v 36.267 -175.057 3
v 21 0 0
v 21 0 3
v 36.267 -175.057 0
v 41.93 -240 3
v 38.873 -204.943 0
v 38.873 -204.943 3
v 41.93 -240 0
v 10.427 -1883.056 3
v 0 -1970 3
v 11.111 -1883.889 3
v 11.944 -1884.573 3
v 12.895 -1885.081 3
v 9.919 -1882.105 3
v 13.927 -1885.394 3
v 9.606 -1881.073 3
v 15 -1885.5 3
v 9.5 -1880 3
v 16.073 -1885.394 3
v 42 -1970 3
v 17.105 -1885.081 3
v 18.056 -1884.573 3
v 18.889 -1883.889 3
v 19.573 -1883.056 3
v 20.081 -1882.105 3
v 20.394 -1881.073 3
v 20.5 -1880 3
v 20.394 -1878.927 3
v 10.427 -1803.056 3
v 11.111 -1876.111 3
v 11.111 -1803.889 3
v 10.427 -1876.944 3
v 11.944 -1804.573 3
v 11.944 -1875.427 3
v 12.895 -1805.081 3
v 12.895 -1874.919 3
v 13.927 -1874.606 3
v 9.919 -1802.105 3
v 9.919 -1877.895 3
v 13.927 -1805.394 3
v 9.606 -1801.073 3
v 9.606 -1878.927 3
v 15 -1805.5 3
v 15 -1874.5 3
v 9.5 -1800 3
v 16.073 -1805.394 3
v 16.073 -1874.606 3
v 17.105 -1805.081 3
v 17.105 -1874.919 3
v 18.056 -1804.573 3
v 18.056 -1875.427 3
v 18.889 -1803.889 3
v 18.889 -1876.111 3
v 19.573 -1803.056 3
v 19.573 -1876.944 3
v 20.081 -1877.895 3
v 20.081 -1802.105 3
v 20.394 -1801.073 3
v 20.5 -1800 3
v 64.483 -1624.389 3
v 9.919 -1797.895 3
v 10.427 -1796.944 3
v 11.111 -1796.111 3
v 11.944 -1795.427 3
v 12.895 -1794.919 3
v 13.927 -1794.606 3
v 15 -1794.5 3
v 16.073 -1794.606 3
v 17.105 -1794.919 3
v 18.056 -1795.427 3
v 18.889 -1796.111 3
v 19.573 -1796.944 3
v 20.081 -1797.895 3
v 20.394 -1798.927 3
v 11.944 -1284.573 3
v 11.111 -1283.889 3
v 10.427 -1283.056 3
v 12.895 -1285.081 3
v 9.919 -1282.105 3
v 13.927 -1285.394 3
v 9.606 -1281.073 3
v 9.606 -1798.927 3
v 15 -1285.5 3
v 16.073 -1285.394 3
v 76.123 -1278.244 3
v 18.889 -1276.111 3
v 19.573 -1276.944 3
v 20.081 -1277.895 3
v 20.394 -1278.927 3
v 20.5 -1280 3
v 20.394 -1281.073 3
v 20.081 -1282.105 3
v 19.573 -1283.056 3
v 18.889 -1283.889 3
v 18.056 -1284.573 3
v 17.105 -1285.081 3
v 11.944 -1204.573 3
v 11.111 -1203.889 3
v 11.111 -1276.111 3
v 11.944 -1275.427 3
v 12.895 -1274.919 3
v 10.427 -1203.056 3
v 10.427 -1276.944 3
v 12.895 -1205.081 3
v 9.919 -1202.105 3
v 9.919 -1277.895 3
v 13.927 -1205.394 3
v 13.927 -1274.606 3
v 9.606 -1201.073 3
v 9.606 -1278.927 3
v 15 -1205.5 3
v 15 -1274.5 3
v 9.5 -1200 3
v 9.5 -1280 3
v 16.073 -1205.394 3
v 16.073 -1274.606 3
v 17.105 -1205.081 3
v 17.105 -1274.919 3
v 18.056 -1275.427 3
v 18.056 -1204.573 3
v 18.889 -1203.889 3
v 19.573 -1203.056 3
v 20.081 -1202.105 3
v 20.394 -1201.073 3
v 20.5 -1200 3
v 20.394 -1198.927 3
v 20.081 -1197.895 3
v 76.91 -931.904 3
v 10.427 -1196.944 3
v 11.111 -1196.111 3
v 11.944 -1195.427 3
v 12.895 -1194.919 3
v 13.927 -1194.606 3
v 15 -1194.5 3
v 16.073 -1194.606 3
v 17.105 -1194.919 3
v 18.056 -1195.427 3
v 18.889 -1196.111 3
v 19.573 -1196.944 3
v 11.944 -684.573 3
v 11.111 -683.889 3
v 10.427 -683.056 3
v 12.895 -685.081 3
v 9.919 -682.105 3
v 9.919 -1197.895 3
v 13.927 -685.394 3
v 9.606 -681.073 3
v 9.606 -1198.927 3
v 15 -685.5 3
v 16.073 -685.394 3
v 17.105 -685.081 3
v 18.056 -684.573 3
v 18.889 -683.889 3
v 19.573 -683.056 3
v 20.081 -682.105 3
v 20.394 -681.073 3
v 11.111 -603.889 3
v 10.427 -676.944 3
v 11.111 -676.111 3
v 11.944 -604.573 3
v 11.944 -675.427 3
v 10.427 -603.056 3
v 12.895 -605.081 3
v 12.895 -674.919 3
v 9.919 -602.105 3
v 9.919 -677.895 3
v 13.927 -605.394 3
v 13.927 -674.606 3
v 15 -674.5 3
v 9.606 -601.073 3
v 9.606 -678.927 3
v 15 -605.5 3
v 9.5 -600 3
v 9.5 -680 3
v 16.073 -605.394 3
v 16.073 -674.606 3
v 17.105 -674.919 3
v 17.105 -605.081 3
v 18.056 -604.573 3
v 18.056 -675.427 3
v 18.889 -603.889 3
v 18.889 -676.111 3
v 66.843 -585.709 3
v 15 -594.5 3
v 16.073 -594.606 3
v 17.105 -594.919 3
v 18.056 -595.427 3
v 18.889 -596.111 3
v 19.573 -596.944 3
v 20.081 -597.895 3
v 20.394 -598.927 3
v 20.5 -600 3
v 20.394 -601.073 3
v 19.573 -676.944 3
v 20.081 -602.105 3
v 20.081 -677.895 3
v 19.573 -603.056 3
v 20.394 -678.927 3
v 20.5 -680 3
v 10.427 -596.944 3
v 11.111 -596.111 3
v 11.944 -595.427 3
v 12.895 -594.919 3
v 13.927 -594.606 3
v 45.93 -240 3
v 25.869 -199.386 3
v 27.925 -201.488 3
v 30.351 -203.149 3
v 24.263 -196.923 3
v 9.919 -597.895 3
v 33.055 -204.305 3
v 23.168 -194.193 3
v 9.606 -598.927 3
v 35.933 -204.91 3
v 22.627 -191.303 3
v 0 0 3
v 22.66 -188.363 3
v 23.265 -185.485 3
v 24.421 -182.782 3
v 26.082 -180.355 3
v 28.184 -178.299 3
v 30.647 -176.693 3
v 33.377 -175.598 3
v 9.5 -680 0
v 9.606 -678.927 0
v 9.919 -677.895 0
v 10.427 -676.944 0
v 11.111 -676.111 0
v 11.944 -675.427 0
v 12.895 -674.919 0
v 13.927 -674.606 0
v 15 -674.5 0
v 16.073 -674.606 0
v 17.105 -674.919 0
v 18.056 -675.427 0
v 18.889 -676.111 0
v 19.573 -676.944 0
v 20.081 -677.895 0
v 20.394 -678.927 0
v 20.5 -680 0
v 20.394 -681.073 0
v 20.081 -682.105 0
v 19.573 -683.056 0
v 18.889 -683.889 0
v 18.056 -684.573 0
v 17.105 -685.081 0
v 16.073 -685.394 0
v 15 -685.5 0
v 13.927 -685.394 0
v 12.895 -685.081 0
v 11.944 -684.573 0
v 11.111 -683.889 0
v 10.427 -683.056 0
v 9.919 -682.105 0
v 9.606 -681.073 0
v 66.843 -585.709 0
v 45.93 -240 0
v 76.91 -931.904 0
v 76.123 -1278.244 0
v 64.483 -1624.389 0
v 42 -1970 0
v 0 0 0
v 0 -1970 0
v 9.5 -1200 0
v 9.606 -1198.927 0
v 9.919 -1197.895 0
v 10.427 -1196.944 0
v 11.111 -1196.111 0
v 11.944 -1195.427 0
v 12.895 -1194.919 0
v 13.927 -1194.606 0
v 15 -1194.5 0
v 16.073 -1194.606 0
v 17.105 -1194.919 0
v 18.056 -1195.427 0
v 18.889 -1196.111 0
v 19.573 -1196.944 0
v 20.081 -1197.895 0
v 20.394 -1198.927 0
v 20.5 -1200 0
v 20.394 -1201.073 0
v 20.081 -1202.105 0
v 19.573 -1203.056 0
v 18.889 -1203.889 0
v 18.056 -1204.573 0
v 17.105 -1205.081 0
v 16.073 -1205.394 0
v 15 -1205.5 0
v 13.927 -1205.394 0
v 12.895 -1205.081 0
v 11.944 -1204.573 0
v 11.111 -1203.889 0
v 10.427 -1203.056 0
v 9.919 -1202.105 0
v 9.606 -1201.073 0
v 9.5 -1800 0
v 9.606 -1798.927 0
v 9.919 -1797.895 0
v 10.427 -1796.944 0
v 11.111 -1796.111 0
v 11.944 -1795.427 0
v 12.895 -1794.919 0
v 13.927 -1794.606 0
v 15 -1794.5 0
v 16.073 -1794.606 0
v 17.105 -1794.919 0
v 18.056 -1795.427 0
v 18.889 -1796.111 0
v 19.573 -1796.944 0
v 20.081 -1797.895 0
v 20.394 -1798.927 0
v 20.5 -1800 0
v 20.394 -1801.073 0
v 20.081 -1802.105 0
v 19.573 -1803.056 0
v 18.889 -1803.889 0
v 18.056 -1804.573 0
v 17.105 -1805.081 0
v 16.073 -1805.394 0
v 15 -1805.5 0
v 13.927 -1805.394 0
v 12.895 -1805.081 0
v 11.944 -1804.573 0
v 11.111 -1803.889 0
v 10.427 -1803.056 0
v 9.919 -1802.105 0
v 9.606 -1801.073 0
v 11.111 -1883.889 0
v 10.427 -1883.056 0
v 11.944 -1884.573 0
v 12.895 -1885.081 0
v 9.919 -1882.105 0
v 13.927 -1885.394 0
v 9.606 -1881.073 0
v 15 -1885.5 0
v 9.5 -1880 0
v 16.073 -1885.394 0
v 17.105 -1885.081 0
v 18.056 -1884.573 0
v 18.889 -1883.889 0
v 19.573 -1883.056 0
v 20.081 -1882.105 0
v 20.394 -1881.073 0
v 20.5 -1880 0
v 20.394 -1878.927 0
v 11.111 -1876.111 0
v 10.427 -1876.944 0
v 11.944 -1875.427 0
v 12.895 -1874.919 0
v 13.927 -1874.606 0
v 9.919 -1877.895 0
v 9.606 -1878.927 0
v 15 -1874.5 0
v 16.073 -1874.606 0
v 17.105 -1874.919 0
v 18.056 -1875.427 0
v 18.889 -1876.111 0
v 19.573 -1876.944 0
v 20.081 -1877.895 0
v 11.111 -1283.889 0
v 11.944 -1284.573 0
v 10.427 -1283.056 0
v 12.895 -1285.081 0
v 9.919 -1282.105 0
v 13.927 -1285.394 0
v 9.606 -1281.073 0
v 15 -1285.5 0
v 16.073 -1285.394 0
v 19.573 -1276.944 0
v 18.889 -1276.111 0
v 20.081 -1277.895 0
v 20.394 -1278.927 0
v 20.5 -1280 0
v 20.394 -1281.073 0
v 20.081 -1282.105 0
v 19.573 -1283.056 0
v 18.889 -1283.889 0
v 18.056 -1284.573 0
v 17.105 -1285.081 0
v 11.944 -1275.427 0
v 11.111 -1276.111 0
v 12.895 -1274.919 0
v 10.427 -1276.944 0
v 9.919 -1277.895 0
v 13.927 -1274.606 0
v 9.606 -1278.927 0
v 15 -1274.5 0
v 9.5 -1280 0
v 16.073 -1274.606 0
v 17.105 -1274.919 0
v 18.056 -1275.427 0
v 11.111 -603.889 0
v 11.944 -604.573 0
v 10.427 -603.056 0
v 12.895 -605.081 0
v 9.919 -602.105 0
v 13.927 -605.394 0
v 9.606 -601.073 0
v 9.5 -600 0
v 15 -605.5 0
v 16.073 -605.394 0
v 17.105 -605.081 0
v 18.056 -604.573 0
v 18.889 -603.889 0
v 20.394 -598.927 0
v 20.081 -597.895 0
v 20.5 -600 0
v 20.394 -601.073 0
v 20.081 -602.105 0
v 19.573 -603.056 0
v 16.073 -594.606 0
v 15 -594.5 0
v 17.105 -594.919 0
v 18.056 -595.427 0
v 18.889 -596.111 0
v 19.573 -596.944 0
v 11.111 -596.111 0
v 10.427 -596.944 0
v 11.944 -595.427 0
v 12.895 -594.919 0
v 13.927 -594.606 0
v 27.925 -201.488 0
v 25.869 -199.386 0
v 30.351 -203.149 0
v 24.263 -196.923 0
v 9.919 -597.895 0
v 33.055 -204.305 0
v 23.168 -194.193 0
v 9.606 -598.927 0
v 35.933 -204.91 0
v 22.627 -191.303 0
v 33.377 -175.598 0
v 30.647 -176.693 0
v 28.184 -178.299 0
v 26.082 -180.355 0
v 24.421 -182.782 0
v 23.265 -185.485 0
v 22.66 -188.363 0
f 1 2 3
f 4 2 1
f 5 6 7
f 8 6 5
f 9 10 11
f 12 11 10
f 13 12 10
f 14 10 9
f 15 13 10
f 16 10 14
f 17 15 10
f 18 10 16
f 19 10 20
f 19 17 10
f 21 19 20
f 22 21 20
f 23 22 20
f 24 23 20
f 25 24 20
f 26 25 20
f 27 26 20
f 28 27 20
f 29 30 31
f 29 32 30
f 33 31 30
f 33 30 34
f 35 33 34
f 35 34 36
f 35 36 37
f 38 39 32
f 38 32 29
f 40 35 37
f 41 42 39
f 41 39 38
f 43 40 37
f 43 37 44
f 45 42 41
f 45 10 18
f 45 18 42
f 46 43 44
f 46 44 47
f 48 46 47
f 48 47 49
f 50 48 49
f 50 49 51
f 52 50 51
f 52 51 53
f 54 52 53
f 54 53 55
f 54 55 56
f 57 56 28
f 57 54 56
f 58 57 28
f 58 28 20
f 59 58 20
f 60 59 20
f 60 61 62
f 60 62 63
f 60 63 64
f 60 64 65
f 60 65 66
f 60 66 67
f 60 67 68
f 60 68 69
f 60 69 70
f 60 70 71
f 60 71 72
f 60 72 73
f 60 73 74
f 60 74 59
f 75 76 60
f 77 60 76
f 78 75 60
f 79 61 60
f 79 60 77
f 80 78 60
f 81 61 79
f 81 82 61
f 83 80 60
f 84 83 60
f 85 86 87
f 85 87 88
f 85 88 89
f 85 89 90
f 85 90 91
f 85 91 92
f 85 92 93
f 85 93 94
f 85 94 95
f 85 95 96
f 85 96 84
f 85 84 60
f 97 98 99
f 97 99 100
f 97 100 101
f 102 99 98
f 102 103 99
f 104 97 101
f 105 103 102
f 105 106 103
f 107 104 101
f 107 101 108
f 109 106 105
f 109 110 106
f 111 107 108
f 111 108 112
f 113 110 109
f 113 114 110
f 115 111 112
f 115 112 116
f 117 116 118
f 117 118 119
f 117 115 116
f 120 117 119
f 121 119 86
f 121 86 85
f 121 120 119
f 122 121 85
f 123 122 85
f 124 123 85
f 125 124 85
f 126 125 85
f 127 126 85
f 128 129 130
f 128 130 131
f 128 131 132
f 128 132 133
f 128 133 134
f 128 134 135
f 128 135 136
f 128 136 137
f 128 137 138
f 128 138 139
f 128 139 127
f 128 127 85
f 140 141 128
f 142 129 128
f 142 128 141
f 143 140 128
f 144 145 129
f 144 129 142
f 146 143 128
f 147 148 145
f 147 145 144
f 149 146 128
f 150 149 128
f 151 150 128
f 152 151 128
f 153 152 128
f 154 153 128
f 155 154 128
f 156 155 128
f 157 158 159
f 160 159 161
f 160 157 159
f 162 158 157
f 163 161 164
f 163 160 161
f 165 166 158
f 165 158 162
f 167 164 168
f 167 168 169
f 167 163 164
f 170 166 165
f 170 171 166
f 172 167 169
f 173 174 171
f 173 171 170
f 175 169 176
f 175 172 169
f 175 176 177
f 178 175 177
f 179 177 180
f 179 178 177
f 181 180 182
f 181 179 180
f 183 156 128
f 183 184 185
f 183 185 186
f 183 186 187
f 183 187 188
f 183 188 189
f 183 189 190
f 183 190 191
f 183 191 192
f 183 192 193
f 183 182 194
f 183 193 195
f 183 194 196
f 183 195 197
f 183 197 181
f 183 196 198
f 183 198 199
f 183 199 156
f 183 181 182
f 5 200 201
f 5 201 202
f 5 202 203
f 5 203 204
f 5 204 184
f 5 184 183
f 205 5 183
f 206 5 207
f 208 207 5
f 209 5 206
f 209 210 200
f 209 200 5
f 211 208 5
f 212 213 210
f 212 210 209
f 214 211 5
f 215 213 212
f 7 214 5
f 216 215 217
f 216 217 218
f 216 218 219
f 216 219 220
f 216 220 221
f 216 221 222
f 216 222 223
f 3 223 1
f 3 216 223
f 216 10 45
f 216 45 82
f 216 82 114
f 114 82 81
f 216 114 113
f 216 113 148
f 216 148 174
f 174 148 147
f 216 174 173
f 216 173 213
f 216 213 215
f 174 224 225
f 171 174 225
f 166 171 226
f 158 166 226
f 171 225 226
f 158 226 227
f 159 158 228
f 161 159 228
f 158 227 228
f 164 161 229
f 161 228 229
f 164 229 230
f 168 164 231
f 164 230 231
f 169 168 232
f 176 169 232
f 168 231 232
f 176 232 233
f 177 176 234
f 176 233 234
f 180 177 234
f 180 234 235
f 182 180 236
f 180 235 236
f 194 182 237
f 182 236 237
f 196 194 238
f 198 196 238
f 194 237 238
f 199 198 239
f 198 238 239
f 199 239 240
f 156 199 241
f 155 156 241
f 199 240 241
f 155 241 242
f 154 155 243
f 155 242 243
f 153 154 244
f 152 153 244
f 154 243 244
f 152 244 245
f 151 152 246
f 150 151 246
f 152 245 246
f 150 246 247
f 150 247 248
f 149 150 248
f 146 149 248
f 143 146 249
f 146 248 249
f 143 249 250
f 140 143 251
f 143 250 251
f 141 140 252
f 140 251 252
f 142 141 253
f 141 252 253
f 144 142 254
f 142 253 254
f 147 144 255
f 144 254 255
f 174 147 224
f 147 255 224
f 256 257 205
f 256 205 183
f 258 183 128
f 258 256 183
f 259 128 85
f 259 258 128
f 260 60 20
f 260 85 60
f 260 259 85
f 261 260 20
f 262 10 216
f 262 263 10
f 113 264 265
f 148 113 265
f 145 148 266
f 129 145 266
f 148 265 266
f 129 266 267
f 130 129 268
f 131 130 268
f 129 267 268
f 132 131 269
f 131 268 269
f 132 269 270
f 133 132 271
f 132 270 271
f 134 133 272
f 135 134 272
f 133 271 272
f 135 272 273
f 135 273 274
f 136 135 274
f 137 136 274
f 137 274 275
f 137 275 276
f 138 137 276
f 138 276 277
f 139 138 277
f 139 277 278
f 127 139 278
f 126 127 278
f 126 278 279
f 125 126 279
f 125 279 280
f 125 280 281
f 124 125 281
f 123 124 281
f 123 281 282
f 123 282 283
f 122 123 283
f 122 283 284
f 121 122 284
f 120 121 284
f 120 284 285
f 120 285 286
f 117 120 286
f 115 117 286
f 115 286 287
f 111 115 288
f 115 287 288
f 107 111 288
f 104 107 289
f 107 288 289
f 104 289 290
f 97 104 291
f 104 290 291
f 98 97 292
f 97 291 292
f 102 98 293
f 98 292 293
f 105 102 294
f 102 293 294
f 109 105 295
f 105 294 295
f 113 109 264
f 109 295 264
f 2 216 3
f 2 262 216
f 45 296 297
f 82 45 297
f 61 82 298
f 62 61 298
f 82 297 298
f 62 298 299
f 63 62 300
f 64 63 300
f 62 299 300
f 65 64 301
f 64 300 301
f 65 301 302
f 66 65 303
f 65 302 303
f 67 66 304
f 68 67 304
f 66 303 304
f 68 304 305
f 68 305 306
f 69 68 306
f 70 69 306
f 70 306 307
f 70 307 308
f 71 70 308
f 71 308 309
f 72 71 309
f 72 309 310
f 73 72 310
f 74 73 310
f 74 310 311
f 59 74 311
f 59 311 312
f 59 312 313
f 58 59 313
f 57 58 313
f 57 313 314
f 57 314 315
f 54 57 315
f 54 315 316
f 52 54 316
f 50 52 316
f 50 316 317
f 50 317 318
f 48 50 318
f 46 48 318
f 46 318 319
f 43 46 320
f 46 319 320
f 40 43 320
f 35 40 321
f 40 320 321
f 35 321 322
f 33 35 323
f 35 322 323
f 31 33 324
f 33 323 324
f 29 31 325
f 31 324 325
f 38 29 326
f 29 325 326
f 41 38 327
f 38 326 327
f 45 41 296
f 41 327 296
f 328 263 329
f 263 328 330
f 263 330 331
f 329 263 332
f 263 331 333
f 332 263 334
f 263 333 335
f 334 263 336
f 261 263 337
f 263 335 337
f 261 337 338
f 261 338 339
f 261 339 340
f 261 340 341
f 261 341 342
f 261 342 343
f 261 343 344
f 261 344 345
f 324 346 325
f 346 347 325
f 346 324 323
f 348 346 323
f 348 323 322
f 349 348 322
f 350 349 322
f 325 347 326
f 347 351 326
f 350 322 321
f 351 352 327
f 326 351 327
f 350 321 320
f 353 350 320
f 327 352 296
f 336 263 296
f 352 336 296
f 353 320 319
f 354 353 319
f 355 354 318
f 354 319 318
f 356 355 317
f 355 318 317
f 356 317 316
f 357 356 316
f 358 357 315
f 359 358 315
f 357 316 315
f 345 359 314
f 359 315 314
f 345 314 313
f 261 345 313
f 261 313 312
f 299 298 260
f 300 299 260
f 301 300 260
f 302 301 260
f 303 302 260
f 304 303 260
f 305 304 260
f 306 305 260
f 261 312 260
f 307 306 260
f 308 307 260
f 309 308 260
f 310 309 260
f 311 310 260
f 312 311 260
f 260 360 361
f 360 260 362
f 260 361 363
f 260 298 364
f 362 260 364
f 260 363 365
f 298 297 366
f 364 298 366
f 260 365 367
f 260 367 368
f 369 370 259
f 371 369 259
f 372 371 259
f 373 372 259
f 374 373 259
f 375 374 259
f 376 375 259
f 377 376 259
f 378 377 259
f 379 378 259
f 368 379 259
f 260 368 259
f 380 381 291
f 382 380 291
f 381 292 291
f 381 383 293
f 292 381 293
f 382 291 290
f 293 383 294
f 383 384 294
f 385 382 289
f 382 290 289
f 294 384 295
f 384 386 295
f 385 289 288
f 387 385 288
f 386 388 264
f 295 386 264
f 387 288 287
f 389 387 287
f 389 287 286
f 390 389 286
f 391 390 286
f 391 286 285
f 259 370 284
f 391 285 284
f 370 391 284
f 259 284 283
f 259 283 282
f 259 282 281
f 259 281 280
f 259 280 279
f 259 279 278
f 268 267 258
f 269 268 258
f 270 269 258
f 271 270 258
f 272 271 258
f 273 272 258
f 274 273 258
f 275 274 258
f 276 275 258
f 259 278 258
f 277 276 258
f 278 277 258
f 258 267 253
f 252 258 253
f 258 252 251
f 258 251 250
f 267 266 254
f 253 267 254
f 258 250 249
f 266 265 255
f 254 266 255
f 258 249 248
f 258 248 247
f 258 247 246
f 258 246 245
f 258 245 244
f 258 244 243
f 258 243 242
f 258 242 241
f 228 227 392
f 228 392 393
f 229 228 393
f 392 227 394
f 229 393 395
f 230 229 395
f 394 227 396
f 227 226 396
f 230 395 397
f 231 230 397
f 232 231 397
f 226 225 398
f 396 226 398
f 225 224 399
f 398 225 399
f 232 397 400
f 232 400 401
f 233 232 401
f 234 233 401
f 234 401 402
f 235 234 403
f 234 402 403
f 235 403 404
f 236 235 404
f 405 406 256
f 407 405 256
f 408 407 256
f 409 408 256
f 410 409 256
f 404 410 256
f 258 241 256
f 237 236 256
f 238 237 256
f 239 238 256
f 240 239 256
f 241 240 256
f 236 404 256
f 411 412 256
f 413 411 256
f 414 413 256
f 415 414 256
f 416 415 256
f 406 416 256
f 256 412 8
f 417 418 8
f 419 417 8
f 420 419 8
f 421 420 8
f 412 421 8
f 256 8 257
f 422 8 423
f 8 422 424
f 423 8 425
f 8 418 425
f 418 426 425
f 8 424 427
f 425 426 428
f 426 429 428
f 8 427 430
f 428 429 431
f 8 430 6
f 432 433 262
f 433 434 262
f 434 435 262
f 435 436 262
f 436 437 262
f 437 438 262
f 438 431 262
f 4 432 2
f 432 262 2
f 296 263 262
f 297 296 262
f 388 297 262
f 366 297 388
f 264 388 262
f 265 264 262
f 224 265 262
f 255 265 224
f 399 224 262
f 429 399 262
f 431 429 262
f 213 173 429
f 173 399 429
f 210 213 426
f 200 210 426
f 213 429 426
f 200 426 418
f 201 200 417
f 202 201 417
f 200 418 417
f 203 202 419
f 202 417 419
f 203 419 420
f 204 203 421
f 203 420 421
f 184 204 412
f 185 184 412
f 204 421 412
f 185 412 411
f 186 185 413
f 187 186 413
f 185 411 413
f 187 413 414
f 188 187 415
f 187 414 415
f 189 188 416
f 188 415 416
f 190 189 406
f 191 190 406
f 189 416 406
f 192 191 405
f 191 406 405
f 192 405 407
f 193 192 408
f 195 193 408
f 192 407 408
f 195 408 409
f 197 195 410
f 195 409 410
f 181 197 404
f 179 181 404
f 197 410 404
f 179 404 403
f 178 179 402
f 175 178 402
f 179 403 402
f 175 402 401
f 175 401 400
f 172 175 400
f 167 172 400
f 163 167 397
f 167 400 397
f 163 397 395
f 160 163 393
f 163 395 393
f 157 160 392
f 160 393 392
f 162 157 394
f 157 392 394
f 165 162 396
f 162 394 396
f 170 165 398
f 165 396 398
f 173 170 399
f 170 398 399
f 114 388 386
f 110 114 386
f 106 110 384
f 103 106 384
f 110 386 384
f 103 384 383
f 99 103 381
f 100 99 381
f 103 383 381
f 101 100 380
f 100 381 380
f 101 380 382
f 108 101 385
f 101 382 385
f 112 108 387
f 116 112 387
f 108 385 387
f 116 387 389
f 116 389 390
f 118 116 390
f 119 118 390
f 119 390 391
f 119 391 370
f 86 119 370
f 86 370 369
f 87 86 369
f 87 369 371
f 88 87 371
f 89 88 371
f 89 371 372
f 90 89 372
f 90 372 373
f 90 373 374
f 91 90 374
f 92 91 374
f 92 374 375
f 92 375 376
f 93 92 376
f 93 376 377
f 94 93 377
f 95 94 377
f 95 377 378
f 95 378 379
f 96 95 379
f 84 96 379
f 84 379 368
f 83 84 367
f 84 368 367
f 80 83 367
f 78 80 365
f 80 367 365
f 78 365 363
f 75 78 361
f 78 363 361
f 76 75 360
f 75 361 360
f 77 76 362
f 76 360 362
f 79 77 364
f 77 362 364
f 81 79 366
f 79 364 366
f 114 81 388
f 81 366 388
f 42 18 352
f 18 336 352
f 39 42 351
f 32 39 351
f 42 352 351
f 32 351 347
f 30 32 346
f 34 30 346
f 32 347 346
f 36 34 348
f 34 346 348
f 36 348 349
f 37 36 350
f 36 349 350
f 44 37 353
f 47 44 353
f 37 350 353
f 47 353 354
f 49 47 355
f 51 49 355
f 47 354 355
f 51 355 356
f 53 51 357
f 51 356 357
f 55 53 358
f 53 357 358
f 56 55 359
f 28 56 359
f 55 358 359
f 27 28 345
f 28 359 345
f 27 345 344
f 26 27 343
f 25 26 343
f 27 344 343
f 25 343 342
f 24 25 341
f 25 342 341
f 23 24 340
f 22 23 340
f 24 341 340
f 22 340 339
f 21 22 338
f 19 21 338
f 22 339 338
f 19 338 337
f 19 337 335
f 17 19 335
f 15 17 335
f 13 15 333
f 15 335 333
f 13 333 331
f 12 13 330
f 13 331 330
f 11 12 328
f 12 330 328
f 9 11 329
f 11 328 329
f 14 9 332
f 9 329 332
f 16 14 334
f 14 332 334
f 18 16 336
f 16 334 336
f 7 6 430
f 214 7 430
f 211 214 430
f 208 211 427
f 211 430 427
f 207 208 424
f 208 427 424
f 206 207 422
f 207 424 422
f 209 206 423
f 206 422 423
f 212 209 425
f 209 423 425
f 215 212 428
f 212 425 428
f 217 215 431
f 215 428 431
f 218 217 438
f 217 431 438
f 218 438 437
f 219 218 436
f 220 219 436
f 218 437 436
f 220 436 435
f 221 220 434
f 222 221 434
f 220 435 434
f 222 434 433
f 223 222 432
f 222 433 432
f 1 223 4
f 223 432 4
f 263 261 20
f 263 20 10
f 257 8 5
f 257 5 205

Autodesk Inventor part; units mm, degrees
ref_plane "YZ Plane" through (0, 0, 0) normal (1, 0, 0) x (0, 1, 0)
ref_plane "XZ Plane" through (0, 0, 0) normal (0, 1, 0) x (-1, 0, 0)
ref_plane "XY Plane" through (0, 0, 0) normal (0, 0, 1) x (1, 0, 0)
sketch "Sketch1" plane through (0, 0, 0) normal (0, 0, 1) x (1, 0, 0)
  line L0 (0, 100) -> (0, 50) construction
  line L1 (0, 47) -> (0, 0) construction
  line L2 (0, 50) -> (0, 47) construction
  arc A0 (42, -1970) -> (25, 0) centre (-10972.0978, -1079.9722) ccw
  line L3 (42, -1970) -> (0, -1970)
  line L4 (0, -1970) -> (0, 0)
  line L5 (0, 0) -> (25, 0)
  line L6 (21, 0) -> (41.9305, -240)
  line L7 (41.9305, -240) -> (45.9305, -240)
  dimension "d115" = 3
  dimension "d131" = 11050
  dimension "d132" = 25
  dimension "d133" = 42
  dimension "d134" = 1970
  dimension "d145" = 4
  dimension "d146" = 240
  dimension "d147" = 4
extrude "Plate3" add sketch "Sketch1" along normal blind 3 contours L3 L4 L5 L6 L7 A0
sketch "Sketch3" plane through (0, 0, 0) normal (0, 0, -1) x (-1, 0, 0)
  line L0 (0, 0) -> (0, -1970) construction
  line L1 (-21, 0) -> (0, 0) construction
  arc A0 (-45.9305, -240) -> (-42, -1970) centre (10972.0978, -1079.9722) ccw construction
  line L2 (0, -1970) -> (-42, -1970) projected
  circle A1 centre (-15, -600) radius 5.5
  line L3 (-41.9305, -240) -> (-21, 0) projected
  line L4 (-45.9305, -240) -> (-41.9305, -240) projected
  circle A2 centre (-15, -680) radius 5.5
  circle A3 centre (-37.5699, -190) radius 15
  circle A4 centre (-15, -1800) radius 5.5
  circle A5 centre (-15, -1880) radius 5.5
  circle A6 centre (-15, -1200) radius 5.5
  circle A7 centre (-15, -1280) radius 5.5
  dimension "d135" = 11
  dimension "d136" = 15
  dimension "d148" = 600
  dimension "d149" = 80
  dimension "d150" = 30
  dimension "d151" = 190
  dimension "d153" = 80
  dimension "d154" = 1200
  dimension "d157" = 80
  dimension "d159" = 1200
extrude "Cut1" cut sketch "Sketch3" against normal blind 3
equation "\"BendReliefWidth\" = Thickness"
equation "\"BendReliefDepth\" = 0.5 * Thickness"
equation "\"CornerReliefSize\" = 4 * Thickness"
equation "\"MinimumRemnant\" = 2 * Thickness"
equation "\"GapSize\" = Thickness"
equation "\"Thickness\" = 3"
properties part number "MSC 814 wall inner rib" material "AISI304"
